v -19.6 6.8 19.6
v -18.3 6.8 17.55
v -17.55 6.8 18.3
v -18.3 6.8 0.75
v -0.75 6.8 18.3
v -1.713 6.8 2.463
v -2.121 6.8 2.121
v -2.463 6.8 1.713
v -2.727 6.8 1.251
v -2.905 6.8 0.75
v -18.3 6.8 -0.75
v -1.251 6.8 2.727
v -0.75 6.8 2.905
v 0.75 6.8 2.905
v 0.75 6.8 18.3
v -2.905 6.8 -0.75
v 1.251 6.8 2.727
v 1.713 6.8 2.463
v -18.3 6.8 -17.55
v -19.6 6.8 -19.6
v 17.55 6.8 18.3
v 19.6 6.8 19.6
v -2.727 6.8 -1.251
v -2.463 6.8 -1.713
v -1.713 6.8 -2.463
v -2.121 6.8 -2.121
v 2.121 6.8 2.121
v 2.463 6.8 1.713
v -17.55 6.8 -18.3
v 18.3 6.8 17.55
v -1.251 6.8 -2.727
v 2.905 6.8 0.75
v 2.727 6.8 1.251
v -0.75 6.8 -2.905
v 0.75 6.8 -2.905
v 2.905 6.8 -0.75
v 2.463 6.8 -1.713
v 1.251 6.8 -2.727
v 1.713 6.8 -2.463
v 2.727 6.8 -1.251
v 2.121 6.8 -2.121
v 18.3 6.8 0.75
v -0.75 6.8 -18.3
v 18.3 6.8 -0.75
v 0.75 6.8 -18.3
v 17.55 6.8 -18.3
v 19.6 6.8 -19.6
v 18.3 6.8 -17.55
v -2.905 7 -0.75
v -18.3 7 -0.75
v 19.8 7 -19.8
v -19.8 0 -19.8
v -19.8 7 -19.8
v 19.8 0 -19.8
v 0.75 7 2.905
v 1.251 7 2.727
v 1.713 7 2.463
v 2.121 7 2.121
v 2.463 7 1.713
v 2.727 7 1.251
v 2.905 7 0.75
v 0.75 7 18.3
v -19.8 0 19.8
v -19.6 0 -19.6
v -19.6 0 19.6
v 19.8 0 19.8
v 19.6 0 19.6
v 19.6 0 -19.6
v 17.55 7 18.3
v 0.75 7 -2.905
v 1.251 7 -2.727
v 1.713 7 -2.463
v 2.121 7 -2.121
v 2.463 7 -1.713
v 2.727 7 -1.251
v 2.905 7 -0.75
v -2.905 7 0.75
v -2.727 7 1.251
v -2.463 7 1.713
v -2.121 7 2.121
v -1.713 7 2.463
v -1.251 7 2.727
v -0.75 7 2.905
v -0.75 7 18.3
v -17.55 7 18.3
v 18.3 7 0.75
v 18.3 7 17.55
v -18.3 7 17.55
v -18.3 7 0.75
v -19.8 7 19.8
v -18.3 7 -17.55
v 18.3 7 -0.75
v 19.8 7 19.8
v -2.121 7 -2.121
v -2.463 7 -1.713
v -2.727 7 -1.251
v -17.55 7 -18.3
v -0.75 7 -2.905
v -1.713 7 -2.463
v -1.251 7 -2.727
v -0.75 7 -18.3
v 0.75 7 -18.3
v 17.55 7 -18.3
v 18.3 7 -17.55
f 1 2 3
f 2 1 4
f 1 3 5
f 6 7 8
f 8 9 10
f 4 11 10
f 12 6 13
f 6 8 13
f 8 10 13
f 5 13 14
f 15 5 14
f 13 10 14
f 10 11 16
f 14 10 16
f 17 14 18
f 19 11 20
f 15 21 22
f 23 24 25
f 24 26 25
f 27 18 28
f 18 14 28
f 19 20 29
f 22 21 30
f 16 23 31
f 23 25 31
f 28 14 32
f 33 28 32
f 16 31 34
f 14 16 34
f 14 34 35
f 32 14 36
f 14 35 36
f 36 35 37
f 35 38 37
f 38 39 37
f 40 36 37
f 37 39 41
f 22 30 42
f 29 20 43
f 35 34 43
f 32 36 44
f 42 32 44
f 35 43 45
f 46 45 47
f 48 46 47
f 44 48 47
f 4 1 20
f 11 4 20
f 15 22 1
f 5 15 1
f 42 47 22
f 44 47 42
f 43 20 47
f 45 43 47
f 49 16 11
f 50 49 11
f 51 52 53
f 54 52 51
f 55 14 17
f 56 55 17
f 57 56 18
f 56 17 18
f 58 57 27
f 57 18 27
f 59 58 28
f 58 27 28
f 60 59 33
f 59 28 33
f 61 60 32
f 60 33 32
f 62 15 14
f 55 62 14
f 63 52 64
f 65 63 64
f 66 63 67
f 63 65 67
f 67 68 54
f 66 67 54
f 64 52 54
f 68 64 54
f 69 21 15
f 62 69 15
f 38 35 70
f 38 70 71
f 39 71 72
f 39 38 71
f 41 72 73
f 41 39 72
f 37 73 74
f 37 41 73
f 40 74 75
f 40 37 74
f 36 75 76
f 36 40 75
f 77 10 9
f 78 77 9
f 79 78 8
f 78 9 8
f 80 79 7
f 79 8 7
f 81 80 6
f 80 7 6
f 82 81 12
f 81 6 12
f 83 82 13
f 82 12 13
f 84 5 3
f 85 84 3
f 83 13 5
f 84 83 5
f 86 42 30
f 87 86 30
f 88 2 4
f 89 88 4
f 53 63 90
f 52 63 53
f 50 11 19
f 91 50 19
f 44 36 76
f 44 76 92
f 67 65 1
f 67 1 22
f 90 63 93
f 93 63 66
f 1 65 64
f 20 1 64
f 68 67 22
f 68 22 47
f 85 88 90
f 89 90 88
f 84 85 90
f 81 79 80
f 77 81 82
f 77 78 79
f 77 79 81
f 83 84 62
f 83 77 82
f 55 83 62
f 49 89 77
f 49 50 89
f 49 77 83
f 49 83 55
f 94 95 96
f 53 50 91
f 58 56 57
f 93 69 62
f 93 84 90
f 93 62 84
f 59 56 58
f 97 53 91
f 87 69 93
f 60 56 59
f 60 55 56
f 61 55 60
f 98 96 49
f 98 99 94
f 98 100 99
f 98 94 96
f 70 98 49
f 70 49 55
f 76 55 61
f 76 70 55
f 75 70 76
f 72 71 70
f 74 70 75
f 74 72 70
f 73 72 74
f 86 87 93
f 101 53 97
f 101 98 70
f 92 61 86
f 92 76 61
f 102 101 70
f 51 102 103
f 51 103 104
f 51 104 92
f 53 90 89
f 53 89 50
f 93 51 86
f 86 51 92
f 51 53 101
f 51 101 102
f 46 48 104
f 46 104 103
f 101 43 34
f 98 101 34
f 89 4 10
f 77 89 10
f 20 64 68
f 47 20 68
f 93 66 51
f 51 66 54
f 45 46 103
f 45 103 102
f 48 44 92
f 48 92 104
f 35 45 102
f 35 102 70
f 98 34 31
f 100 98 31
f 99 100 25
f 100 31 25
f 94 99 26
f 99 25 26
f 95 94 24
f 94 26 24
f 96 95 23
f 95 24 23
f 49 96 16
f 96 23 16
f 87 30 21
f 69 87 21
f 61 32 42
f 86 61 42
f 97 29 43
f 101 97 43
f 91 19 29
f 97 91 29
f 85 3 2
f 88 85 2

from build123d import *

# Parameters (mm, degrees)
SKETCH1_W           = 39.6
SKETCH1_H           = 39.6
BOSS_EXTRUDE1_DEPTH = 7
SHELL2_T            = -0.2
CUT_EXTRUDE1_DEPTH  = 8


with BuildPart() as part:
    # Sketch1 → Boss-Extrude1 (new body)
    with BuildSketch(Plane(origin=(0, 0, 0), x_dir=(1, 0, 0), z_dir=(0, 1, 0))):
        Rectangle(SKETCH1_W, SKETCH1_H)
    extrude(amount=BOSS_EXTRUDE1_DEPTH)

    # Shell2
    shell2_openings = [part.faces().sort_by_distance(p)[0] for p in [
        (0, 0, 0),
    ]]
    offset(amount=SHELL2_T, openings=shell2_openings, kind=Kind.INTERSECTION)

    # Sketch2 → Cut-Extrude1 (cut, through all)
    with BuildSketch(Plane(origin=(0, 0, 0), x_dir=(1, 0, 0), z_dir=(0, 1, 0))):
        with BuildLine():
            Line((17.55, -18.3), (0.75, -18.3))
            Line((0.75, -18.3), (0.75, -2.90473751))
            ThreePointArc((0.75, -2.90473751), (2.121320344, -2.121320344), (2.90473751, -0.75))
            Line((2.90473751, -0.75), (18.3, -0.75))
            Line((18.3, -0.75), (18.3, -17.55))
            Line((18.3, -17.55), (17.55, -18.3))
        make_face()
        with BuildLine():
            Line((17.55, 18.3), (0.75, 18.3))
            Line((0.75, 18.3), (0.75, 2.90473751))
            ThreePointArc((0.75, 2.90473751), (2.121320344, 2.121320344), (2.90473751, 0.75))
            Line((2.90473751, 0.75), (18.3, 0.75))
            Line((18.3, 0.75), (18.3, 17.55))
            Line((18.3, 17.55), (17.55, 18.3))
        make_face()
        with BuildLine():
            Line((-18.3, -17.55), (-18.3, -0.75))
            Line((-18.3, -0.75), (-2.90473751, -0.75))
            ThreePointArc((-2.90473751, -0.75), (-2.121320344, -2.121320344), (-0.75, -2.90473751))
            Line((-0.75, -2.90473751), (-0.75, -18.3))
            Line((-0.75, -18.3), (-17.55, -18.3))
            Line((-17.55, -18.3), (-18.3, -17.55))
        make_face()
        with BuildLine():
            Line((-0.75, 18.3), (-0.75, 2.90473751))
            ThreePointArc((-0.75, 2.90473751), (-2.121320344, 2.121320344), (-2.90473751, 0.75))
            Line((-2.90473751, 0.75), (-18.3, 0.75))
            Line((-18.3, 0.75), (-18.3, 17.55))
            Line((-18.3, 17.55), (-17.55, 18.3))
            Line((-17.55, 18.3), (-0.75, 18.3))
        make_face()
    extrude(amount=CUT_EXTRUDE1_DEPTH, mode=Mode.SUBTRACT)


solid = part.part
